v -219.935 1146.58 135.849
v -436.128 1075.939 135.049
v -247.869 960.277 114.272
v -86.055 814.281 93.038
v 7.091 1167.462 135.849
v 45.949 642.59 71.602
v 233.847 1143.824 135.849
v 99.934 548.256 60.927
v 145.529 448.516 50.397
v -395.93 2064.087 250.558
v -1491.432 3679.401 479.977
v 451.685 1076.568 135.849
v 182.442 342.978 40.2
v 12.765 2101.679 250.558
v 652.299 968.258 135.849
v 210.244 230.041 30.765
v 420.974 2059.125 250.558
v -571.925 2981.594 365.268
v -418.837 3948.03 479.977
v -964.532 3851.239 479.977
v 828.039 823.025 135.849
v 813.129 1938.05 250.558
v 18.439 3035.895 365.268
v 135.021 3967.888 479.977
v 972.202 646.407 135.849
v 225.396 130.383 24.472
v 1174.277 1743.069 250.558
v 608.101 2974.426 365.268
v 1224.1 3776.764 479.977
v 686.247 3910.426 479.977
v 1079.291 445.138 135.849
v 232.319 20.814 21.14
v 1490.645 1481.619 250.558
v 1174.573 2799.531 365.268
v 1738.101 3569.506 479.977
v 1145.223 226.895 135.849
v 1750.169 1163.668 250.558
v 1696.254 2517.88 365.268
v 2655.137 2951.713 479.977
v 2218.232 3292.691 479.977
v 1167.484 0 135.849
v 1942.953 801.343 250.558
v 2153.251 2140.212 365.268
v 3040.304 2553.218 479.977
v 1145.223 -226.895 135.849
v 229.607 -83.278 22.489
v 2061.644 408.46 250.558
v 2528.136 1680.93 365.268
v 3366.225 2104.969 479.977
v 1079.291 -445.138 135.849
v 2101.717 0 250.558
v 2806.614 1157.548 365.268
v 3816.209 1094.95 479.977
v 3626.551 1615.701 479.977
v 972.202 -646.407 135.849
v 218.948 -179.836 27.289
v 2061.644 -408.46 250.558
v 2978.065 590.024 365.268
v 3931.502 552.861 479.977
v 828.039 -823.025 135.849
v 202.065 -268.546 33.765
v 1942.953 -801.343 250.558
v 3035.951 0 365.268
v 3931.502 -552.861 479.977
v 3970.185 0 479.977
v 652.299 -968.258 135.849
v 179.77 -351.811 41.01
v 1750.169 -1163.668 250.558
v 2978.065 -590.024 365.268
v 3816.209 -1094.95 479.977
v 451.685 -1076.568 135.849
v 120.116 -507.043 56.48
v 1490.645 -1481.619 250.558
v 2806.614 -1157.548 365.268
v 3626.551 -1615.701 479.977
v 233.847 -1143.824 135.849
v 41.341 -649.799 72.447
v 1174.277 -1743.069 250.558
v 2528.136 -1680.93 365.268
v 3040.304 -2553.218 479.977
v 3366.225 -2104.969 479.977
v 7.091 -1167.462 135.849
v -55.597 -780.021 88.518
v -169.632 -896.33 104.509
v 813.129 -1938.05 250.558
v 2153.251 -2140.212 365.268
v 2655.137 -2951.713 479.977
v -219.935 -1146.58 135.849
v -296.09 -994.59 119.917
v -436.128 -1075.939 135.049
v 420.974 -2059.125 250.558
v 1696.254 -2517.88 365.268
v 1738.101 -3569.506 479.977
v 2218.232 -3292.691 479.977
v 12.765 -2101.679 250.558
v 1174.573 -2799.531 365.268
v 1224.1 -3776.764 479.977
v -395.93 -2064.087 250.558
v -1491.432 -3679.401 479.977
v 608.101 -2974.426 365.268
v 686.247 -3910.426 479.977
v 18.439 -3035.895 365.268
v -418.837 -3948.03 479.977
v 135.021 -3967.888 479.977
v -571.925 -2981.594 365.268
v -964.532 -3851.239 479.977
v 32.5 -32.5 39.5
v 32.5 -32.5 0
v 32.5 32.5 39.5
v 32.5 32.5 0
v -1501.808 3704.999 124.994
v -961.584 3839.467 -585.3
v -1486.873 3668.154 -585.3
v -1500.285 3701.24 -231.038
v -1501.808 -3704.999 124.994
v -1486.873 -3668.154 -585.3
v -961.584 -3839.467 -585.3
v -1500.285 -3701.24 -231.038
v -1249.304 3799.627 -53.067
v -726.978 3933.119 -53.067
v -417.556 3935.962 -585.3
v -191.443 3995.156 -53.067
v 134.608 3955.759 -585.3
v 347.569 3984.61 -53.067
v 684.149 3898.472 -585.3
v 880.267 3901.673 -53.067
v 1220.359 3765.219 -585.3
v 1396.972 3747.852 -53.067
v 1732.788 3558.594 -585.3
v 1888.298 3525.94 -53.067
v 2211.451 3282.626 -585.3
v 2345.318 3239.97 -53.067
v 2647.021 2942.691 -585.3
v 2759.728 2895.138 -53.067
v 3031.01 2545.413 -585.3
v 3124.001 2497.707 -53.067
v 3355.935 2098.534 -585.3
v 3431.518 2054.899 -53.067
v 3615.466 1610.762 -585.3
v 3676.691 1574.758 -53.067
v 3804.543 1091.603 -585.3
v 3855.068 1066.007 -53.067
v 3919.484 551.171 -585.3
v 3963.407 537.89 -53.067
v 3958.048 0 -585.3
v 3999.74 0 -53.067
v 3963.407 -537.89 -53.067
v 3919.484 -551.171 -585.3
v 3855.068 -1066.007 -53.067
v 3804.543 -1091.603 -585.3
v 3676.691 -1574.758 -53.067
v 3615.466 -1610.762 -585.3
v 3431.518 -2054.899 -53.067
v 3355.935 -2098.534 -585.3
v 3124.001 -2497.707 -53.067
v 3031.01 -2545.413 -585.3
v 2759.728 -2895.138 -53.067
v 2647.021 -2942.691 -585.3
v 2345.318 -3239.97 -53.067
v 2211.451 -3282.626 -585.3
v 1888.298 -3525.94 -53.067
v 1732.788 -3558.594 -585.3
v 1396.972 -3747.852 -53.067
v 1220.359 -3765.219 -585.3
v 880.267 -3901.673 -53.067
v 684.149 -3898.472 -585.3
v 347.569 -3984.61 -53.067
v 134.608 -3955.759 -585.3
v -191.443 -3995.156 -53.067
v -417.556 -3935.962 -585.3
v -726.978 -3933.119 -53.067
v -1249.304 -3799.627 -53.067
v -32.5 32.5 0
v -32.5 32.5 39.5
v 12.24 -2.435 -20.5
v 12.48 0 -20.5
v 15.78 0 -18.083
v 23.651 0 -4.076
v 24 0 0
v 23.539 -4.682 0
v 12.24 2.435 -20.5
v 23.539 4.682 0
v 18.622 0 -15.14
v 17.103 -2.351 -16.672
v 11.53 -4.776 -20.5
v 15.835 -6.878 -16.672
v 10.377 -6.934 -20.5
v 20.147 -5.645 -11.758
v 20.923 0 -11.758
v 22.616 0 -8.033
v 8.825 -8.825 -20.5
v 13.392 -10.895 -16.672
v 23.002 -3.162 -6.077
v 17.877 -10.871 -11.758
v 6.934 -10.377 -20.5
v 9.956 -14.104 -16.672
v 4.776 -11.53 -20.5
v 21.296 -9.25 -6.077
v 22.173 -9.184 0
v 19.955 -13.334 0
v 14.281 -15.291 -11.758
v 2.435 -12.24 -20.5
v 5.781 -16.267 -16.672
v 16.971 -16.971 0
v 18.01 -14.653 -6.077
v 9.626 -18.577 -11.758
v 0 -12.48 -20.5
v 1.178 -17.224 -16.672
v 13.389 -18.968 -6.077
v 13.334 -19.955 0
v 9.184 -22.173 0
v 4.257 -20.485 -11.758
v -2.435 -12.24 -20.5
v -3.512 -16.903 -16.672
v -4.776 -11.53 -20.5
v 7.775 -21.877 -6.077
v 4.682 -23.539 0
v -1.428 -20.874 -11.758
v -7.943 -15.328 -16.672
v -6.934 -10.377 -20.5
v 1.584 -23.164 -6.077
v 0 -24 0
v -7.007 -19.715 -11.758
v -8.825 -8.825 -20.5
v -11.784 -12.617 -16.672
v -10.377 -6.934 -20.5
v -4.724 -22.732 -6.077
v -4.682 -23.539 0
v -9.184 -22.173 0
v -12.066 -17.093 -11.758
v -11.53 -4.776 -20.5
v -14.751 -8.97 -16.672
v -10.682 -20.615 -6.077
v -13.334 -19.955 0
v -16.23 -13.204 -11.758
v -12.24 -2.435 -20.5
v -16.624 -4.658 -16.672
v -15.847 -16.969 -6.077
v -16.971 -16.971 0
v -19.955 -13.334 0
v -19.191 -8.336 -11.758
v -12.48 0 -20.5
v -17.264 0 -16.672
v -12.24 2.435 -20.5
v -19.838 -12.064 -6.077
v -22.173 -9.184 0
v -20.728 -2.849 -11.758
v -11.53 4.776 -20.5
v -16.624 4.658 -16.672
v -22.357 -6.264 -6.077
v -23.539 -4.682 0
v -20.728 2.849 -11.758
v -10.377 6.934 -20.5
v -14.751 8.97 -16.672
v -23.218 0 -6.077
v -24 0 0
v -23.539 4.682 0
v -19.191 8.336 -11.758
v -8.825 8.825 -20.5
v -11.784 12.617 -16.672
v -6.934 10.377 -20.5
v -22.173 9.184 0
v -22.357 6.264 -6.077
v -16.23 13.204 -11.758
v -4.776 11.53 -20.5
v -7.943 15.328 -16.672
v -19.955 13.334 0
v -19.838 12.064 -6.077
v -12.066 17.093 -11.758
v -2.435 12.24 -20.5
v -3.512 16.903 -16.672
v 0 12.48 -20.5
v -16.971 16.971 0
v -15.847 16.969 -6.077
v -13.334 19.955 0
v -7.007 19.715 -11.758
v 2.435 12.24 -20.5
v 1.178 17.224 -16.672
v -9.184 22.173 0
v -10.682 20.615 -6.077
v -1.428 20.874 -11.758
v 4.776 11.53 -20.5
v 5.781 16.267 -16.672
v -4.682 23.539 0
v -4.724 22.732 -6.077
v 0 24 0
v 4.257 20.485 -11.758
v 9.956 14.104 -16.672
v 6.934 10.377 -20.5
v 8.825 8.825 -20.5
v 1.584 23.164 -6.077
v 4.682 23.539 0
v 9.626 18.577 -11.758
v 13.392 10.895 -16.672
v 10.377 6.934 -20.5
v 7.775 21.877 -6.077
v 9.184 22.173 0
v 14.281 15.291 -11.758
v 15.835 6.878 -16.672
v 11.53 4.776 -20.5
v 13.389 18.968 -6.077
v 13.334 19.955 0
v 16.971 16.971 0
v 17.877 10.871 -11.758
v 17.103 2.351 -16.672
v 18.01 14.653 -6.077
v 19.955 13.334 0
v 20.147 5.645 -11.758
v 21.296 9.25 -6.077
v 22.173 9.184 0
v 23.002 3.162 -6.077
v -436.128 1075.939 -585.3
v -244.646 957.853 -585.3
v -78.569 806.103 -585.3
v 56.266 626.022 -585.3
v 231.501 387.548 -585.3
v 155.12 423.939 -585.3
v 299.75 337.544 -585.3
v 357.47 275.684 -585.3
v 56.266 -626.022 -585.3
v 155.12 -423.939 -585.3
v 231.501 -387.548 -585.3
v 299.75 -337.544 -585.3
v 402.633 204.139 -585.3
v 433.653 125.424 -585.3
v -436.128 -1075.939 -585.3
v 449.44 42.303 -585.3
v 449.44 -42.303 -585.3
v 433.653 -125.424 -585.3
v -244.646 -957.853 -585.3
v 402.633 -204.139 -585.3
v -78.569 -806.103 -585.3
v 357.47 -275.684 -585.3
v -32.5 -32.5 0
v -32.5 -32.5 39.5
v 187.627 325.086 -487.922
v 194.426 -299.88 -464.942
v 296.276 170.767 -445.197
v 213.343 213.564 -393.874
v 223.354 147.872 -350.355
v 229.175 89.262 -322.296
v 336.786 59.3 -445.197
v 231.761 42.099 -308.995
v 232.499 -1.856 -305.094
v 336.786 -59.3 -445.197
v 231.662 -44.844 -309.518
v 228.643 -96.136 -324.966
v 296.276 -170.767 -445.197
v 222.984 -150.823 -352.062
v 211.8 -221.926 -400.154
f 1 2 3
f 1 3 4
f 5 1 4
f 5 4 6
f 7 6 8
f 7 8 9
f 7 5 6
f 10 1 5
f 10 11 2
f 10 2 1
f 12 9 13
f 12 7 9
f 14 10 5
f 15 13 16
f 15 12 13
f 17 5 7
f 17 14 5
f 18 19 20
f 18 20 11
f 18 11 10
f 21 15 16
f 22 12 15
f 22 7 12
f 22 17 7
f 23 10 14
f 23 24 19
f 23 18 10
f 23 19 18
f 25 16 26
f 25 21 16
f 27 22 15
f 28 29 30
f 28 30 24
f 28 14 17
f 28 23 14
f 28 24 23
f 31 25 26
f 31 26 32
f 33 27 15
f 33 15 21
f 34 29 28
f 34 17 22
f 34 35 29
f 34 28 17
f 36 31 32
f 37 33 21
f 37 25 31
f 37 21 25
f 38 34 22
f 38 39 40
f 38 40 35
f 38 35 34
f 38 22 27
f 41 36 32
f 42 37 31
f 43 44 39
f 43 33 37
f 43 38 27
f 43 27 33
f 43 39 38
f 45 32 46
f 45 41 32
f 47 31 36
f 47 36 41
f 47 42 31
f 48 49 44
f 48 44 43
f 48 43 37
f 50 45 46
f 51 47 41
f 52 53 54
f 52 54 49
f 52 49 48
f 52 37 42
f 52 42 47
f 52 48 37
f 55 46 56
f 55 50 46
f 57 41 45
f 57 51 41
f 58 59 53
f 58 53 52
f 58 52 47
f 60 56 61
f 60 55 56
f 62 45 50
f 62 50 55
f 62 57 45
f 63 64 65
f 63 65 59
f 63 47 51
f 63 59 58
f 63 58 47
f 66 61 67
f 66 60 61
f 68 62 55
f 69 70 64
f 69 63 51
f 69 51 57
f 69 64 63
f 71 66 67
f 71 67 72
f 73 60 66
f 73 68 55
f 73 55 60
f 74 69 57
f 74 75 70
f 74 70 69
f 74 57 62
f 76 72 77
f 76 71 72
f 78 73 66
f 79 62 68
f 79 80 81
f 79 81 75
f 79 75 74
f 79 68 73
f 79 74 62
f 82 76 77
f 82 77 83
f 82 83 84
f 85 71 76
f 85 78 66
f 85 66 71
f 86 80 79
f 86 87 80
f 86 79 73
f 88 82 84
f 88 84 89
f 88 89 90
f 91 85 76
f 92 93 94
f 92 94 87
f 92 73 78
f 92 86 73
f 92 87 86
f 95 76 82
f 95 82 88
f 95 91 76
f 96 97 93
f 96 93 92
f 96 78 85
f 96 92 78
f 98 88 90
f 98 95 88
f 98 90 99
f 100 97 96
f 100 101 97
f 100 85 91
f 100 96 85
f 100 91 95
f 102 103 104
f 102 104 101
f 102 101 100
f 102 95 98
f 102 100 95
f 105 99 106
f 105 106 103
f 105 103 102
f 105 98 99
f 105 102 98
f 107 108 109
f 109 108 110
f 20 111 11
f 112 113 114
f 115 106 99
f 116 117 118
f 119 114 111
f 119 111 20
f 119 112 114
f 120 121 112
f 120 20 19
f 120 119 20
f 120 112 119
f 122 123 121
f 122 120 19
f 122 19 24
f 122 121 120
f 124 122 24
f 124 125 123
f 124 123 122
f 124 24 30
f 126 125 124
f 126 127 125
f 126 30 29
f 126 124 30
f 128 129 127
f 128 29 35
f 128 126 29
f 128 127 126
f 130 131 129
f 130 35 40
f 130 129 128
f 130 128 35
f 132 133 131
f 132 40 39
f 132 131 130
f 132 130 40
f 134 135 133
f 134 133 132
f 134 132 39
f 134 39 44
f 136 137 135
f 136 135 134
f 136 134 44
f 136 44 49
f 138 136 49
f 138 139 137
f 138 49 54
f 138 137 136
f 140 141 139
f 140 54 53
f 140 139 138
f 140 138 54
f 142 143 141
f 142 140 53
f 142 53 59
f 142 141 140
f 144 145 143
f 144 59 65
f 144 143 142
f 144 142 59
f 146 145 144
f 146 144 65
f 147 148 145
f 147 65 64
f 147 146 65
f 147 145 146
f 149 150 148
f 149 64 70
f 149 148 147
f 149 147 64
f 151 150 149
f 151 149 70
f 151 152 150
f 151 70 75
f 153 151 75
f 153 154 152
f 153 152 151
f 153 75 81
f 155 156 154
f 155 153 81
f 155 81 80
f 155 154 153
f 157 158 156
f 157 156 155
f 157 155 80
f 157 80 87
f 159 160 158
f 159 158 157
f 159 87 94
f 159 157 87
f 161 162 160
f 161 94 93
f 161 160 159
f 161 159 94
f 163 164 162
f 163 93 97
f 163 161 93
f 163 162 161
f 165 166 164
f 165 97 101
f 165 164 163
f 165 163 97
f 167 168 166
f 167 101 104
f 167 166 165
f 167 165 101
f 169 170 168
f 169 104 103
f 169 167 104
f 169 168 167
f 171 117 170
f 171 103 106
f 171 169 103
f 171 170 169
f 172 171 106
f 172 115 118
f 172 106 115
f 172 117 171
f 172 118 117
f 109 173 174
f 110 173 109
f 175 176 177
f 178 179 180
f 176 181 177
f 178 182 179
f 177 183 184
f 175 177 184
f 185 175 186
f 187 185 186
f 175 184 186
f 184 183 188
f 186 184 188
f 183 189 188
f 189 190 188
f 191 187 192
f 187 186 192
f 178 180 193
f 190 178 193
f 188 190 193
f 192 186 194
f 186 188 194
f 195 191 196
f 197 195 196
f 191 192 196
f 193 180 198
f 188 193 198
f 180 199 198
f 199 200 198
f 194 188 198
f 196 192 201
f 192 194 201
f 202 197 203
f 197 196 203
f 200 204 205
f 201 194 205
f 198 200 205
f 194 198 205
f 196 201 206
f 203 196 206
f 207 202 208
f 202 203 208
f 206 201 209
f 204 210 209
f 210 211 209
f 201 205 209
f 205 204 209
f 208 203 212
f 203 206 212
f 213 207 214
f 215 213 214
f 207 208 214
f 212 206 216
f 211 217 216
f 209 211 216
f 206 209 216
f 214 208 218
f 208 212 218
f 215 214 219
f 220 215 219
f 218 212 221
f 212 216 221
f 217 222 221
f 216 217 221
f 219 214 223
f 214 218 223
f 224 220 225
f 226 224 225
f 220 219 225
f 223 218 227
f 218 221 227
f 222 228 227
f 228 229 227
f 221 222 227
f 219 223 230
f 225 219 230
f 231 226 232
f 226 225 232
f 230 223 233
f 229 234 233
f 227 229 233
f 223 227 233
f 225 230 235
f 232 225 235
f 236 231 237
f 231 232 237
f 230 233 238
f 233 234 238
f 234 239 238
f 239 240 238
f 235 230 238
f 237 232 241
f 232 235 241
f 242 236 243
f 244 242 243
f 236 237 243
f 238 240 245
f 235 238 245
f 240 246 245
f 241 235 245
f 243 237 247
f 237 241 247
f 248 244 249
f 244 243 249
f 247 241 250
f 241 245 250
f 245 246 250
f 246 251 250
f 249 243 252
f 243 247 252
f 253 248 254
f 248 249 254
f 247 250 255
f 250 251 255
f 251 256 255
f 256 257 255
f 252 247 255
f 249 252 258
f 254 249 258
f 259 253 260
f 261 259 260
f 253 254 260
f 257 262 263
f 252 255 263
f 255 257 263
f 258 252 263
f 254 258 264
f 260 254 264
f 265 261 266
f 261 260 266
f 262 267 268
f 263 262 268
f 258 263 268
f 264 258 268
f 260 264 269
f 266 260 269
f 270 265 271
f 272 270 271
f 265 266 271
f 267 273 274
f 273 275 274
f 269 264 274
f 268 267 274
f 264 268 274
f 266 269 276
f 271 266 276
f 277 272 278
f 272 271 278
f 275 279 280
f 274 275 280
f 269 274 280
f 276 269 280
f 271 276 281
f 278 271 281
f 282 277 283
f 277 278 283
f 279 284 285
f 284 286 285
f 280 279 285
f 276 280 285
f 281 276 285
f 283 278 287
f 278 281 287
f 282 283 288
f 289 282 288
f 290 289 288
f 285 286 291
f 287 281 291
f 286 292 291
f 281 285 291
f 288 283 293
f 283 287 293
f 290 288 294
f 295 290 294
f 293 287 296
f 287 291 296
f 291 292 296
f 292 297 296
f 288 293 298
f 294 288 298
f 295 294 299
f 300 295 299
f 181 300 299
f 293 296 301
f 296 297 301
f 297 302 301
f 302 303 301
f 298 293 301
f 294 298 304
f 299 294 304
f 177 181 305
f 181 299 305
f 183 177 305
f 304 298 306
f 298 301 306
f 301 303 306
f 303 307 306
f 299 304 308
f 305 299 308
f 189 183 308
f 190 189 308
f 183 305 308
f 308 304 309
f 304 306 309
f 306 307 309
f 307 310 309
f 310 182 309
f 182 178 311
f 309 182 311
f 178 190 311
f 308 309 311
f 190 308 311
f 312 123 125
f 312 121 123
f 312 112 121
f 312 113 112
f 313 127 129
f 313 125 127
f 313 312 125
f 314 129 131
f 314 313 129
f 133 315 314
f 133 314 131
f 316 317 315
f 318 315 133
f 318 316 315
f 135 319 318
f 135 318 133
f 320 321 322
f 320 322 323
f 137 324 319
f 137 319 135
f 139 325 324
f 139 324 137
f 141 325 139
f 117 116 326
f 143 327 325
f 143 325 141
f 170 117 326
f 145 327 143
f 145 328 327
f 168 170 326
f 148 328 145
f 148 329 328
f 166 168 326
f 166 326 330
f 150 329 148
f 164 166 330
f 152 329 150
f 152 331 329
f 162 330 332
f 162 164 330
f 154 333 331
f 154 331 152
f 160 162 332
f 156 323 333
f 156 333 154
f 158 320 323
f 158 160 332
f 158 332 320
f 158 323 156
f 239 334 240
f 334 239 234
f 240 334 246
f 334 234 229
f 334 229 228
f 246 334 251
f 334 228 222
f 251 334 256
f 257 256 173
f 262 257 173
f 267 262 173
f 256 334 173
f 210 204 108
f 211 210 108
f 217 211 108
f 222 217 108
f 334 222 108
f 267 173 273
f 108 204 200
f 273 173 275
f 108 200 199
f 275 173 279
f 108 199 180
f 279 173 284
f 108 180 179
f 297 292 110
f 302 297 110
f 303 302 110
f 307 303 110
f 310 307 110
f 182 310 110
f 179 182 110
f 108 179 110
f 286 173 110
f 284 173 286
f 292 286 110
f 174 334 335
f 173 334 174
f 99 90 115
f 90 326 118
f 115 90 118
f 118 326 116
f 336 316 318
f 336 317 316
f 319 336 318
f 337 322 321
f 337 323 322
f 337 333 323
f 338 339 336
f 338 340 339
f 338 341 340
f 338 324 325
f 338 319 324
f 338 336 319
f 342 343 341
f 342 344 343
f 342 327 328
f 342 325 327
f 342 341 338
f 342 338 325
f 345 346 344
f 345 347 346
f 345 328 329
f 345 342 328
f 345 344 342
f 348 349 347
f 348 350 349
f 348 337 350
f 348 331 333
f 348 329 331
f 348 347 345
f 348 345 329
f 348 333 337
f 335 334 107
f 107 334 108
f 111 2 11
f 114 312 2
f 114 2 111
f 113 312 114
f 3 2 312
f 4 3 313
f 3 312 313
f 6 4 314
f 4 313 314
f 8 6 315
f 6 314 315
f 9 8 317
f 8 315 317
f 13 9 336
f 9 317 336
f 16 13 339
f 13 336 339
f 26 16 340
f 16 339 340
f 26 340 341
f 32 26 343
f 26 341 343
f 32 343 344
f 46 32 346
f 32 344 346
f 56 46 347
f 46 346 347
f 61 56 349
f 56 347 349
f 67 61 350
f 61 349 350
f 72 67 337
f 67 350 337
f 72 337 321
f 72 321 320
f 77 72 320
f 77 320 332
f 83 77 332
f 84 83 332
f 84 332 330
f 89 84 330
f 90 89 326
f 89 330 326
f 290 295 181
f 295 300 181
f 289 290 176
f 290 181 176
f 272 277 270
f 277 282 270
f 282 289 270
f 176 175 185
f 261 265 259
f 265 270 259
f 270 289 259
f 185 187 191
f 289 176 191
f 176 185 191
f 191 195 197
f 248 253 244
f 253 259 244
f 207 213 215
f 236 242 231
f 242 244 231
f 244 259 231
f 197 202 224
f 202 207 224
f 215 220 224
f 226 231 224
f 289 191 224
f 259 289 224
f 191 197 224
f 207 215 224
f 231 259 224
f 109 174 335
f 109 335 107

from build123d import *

# Parameters (mm, degrees)
SCHIZZO1_W                    = 65
SCHIZZO1_H                    = 65
ESTRUSIONE_ESTRUSIONE1_DEPTH  = 39.5
TAGLIO_ESTRUSIONE4_REACH      = 5711.959
TAGLIO_ESTRUSIONE4_END_RADIUS = 4000
SCHIZZO8_W                    = 775.2
SCHIZZO8_H                    = 1000
SCHIZZO8_W_2                  = 524.8
TAGLIA_RIVOLUZIONE1_ANGLE     = 135.87
TAGLIO_ESTRUSIONE11_REACH     = 5758.285
SCHIZZO16_R                   = 1200


with BuildPart() as part:
    # Schizzo1 → Estrusione-Estrusione1 (new body)
    with BuildSketch(Plane.XY):
        Rectangle(SCHIZZO1_W, SCHIZZO1_H)
    extrude(amount=ESTRUSIONE_ESTRUSIONE1_DEPTH)

    # Schizzo2 → Rivoluzione1 (revolve)
    with BuildSketch(Plane(origin=(0, 0, 0), x_dir=(1, 0, 0), z_dir=(0, 1, 0))):
        with BuildLine():
            Line((0, 0), (0, 20.5))
            Line((0, 20.5), (12.479983974, 20.5))
            ThreePointArc((12.479983974, 20.5), (20.922710333, 11.757558943), (24, 0))
            Line((24, 0), (0, 0))
        make_face()
    revolve(axis=Axis((0, 0, 0), (0, 0, -1)))


with BuildPart() as body_2:
    # Schizzo5 → Rivoluzione5 (revolve)
    with BuildSketch(Plane(origin=(0, 0, 0), x_dir=(1, 0, 0), z_dir=(0, 1, 0))):
        with BuildLine():
            Line((32.5, 3.509501771), (3970.184606565, -479.977373621))
            ThreePointArc((3970.184606565, -479.977373621), (3999.74044582, 53.06715998), (3958.048402938, 585.3))
            Line((3958.048402938, 585.3), (451.426834996, 585.3))
            Line((451.426834996, 585.3), (20.15926203, 33.302678747))
            ThreePointArc((20.15926203, 33.302678747), (30.251575463, 20.03061284), (32.5, 3.509501771))
        make_face()
    revolve(axis=Axis((0, 0, 992.5), (0, 0, -1)))

    # Taglio-Estrusione4: up to this sphere (the profile starts inside it)
    taglio_estrusione4_end = Location((0, 0, -7.5)) * Sphere(TAGLIO_ESTRUSIONE4_END_RADIUS, mode=Mode.PRIVATE)
    # Schizzo8 → Taglio-Estrusione4 (cut, up to the surface)
    with BuildSketch(Plane(origin=(32.5, 0, 0), x_dir=(0, 0, -1), z_dir=(1, 0, 0)), mode=Mode.PRIVATE) as taglio_estrusione4_sk1:
        with Locations((-427.1, 0)):
            Rectangle(SCHIZZO8_W, SCHIZZO8_H)
    taglio_estrusione4_tool1 = extrude(taglio_estrusione4_sk1.sketch, amount=-TAGLIO_ESTRUSIONE4_REACH, mode=Mode.PRIVATE) & taglio_estrusione4_end
    add(taglio_estrusione4_tool1.solids().sort_by_distance((32.5, 0, 427.1))[0], mode=Mode.SUBTRACT)
    # Schizzo8 → Taglio-Estrusione4 (cut, up to the surface)
    with BuildSketch(Plane(origin=(32.5, 0, 0), x_dir=(0, 0, -1), z_dir=(1, 0, 0)), mode=Mode.PRIVATE) as taglio_estrusione4_sk2:
        with Locations((322.9, 0)):
            Rectangle(SCHIZZO8_W_2, SCHIZZO8_H)
    taglio_estrusione4_tool2 = extrude(taglio_estrusione4_sk2.sketch, amount=-TAGLIO_ESTRUSIONE4_REACH, mode=Mode.PRIVATE) & taglio_estrusione4_end
    add(taglio_estrusione4_tool2.solids().sort_by_distance((32.5, 0, -322.9))[0], mode=Mode.SUBTRACT)

    # Schizzo11 → Taglia-Rivoluzione1 (revolve, symmetric, cut)
    with BuildSketch(Plane(origin=(0, 0, 0), x_dir=(1, 0, 0), z_dir=(0, 1, 0))) as taglia_rivoluzione1_sk:
        Polygon((0, -514.7), (-40000, -514.7), (-40000, 585.3), (0, 585.3), (0, 60.5), (-202.66, 60.5), (-202.66, -39.5), (0, -39.5), align=None)
    revolve(axis=Axis((0, 0, 992.5), (0, 0, -1)), revolution_arc=TAGLIA_RIVOLUZIONE1_ANGLE / 2, mode=Mode.SUBTRACT)
    revolve(taglia_rivoluzione1_sk.sketch, axis=Axis((0, 0, 992.5), (0, 0, 1)), revolution_arc=TAGLIA_RIVOLUZIONE1_ANGLE / 2, mode=Mode.SUBTRACT)

    # Taglio-Estrusione11: up to this cone (the profile starts outside it)
    taglio_estrusione11_end = Plane(origin=(0, 0, -585.3), z_dir=(0, 0, 1)).offset(577.800001) * Cone(8.144e-06, 42195.736678139, 5180.984999, align=(Align.CENTER, Align.CENTER, Align.MIN), mode=Mode.PRIVATE)
    # Schizzo16 → Taglio-Estrusione11 (cut, up to the surface)
    with BuildSketch(Plane(origin=(0, 0, -585.3), x_dir=(-1, 0, 0), z_dir=(0, 0, -1)), mode=Mode.PRIVATE) as taglio_estrusione11_sk1:
        with Locations((967.5, 0)):
            Circle(SCHIZZO16_R)
    taglio_estrusione11_tool1 = extrude(taglio_estrusione11_sk1.sketch, amount=-TAGLIO_ESTRUSIONE11_REACH, mode=Mode.PRIVATE) - taglio_estrusione11_end
    add(taglio_estrusione11_tool1.solids().sort_by_distance((-967.5, 0, -585.3))[0], mode=Mode.SUBTRACT)


solid = Compound([part.part, body_2.part])
